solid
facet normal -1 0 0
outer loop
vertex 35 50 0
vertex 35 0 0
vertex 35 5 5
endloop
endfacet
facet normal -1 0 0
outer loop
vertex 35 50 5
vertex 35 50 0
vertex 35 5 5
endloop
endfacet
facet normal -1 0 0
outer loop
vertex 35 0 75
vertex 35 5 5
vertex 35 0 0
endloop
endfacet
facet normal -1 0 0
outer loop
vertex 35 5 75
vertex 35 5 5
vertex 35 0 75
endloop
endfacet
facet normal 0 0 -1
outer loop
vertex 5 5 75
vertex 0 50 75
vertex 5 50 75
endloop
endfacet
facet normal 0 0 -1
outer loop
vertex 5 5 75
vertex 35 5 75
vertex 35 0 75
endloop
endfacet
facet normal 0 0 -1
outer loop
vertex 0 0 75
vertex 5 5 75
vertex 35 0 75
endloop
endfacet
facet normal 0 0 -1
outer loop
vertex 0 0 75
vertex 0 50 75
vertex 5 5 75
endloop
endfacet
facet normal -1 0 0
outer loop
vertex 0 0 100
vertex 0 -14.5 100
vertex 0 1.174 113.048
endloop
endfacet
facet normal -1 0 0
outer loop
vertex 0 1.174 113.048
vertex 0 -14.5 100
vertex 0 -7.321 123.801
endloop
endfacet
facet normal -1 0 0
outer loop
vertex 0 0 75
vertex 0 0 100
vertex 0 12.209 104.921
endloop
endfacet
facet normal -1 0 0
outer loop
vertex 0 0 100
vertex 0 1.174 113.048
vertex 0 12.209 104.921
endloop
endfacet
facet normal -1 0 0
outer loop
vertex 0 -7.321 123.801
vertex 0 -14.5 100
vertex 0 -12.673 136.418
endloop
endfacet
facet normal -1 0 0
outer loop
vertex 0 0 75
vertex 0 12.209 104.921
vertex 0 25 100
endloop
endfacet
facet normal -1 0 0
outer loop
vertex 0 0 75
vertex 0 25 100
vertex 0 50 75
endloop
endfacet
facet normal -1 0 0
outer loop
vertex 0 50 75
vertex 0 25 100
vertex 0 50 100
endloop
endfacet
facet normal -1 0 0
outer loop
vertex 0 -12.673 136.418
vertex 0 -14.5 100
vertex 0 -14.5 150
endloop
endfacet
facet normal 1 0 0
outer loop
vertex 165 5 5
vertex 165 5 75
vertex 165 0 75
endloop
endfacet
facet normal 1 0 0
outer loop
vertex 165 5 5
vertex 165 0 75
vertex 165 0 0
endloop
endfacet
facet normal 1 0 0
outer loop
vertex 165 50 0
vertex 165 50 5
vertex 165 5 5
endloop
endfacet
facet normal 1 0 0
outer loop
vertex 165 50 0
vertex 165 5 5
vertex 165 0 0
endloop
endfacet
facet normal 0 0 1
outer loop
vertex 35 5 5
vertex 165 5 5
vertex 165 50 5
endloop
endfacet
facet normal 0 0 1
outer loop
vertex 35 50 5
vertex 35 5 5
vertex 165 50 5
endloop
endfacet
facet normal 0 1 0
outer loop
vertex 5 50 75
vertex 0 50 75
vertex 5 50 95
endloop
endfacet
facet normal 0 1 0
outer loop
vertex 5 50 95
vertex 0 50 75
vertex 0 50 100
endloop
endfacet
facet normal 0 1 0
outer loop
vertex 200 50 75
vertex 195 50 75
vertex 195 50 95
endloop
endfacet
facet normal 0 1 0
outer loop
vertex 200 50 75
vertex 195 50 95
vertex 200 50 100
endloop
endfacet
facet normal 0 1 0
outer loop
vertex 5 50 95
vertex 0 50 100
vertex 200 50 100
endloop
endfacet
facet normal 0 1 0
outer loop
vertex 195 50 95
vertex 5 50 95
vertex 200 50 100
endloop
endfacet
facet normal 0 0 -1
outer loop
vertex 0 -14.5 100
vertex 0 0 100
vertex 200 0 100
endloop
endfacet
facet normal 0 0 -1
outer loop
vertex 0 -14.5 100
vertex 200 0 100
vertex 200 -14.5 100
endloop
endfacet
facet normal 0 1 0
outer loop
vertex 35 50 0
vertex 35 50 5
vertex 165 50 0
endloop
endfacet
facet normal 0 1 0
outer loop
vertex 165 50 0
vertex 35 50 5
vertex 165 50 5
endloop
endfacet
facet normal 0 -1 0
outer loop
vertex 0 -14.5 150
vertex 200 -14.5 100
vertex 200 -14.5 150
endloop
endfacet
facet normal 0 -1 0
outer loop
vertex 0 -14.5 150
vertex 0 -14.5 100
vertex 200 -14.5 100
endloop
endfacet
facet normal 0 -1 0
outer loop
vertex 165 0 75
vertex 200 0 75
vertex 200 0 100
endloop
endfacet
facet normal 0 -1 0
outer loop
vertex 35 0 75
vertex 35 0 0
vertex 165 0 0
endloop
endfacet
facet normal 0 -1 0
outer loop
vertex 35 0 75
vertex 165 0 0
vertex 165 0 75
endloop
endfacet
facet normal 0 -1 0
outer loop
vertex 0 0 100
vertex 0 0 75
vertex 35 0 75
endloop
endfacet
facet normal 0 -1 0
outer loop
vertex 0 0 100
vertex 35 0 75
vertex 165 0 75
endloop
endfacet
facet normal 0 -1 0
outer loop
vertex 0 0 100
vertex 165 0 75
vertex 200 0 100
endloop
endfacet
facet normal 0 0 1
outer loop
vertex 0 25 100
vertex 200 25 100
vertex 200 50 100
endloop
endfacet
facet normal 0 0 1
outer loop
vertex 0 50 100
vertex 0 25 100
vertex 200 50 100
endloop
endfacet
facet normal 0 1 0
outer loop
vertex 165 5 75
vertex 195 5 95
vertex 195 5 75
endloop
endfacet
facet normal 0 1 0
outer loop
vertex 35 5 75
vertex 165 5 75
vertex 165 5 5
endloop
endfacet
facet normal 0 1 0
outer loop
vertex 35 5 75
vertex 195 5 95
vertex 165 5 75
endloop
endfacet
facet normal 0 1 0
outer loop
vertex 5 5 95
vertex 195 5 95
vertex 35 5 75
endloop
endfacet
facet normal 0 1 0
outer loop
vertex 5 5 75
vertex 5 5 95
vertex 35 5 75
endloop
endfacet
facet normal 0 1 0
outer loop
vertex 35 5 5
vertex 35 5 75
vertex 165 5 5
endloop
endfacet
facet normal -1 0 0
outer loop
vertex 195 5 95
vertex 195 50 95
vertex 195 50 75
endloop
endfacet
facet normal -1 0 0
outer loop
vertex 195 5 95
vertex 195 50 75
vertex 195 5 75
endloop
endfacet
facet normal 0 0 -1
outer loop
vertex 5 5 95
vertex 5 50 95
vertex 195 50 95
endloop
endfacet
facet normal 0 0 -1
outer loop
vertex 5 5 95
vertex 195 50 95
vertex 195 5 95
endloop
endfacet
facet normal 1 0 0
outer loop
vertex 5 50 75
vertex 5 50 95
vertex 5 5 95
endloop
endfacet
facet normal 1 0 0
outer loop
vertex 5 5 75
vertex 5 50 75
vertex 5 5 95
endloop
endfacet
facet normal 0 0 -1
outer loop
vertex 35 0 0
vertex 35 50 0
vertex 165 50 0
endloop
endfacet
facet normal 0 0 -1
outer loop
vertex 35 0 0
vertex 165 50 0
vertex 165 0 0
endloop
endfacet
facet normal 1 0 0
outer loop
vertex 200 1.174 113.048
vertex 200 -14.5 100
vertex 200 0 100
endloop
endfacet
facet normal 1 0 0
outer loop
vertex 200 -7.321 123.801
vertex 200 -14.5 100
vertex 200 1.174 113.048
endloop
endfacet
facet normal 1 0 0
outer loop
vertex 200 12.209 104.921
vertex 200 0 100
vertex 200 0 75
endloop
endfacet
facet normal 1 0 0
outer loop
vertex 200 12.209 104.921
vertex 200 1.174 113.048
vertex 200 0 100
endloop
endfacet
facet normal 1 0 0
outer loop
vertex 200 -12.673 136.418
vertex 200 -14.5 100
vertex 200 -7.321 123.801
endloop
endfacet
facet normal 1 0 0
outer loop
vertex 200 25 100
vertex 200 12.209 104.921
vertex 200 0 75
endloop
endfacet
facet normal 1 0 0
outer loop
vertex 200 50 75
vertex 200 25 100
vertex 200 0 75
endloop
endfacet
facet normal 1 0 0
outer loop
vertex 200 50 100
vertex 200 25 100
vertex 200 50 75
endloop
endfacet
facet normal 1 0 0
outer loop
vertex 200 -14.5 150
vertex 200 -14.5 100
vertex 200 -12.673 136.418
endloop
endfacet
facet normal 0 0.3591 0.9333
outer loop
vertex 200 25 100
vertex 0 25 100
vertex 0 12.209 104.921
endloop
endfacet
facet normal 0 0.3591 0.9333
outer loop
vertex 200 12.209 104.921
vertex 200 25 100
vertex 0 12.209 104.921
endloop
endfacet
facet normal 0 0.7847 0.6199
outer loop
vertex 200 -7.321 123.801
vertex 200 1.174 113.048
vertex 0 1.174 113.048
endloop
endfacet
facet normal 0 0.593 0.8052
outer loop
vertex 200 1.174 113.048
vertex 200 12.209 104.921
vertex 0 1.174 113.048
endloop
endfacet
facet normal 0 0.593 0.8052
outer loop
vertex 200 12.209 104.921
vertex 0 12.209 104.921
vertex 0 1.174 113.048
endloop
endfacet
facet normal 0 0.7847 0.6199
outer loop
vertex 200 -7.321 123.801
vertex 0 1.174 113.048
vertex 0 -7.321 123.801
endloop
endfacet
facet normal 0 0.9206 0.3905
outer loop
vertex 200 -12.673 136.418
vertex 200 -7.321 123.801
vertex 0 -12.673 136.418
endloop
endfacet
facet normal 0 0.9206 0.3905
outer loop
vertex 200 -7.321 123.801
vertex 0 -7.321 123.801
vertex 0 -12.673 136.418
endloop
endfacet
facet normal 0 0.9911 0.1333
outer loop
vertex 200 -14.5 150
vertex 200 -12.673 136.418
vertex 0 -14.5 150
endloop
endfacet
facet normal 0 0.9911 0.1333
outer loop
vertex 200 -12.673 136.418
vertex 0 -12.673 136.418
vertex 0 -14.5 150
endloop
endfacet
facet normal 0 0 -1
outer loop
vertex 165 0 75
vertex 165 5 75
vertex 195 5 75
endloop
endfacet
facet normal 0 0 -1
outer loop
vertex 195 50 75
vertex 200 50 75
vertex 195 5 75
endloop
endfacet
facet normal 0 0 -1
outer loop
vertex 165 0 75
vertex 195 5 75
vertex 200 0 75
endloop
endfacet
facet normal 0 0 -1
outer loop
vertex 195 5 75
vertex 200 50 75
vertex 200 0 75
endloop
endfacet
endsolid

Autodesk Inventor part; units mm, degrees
ref_plane "YZ Plane" through (0, 0, 0) normal (1, 0, 0) x (0, 1, 0)
ref_plane "XZ Plane" through (0, 0, 0) normal (0, 1, 0) x (-1, 0, 0)
ref_plane "XY Plane" through (0, 0, 0) normal (0, 0, 1) x (1, 0, 0)
sketch "Sketch6" plane through (0, 0, 0) normal (1, 0, 0) x (0, 1, 0)
  line L0 (0, 0) -> (0, 100)
  line L1 (0, 100) -> (50, 100)
  line L2 (50, 100) -> (50, 95)
  line L3 (50, 95) -> (5, 95)
  line L4 (5, 95) -> (5, 5)
  line L5 (5, 5) -> (50, 5)
  line L6 (50, 5) -> (50, 0)
  line L7 (50, 0) -> (0, 0)
  line L8 (0, 100) -> (-14.5, 100)
  line L9 (-14.5, 100) -> (-14.5, 150)
  arc A0 (-14.5, 150) -> (25, 100) centre (36.8956, 150) ccw
  dimension "d66" = 14.5
  dimension "d67" = 50
  dimension "d68" = 50
  dimension "d69" = 45
  dimension "d87" = 90
extrude "Extrusion6" add sketch "Sketch6" along normal blind 200
sketch "Sketch7" plane through (0, 5, 95) normal (0, 0, -1) x (-1, 0, 0)
  line L0 (0, 45) -> (-200, 45) projected
  line L1 (0, 0) -> (-200, 0) projected
  line L2 (-200, 45) -> (-195, 45)
  line L3 (-195, 45) -> (-195, 0)
  line L4 (-195, 0) -> (-200, 0)
  line L5 (-200, 0) -> (-200, 45)
  point P0 (0, -5)
  dimension "d52" = 5
extrude "Extrusion7" add sketch "Sketch7" along normal blind 90
sketch "Sketch8" plane through (0, 5, 95) normal (0, 0, -1) x (-1, 0, 0)
  line L0 (0, 45) -> (-195, 45) projected
  line L1 (0, 0) -> (-195, 0) projected
  line L2 (0, 45) -> (-5, 45)
  line L3 (-5, 45) -> (-5, 0)
  line L4 (-5, 0) -> (0, 0)
  line L5 (0, 0) -> (0, 45)
  point P0 (0, -5)
  dimension "d55" = 5
extrude "Extrusion8" add sketch "Sketch8" along normal blind 90
sketch "Sketch9" plane through (200, 0, 0) normal (1, 0, 0) x (0, 0, -1)
  line L0 (0, 0) -> (0, 50) projected
  line L1 (-100, 0) -> (0, 0) projected
  line L2 (0, 50) -> (-75, 50)
  line L3 (-75, 50) -> (-75, 0)
  line L4 (-75, 0) -> (0, 0)
  line L5 (0, 0) -> (0, 50)
  circle A0 centre (-35, 18) radius 33.5
  dimension "d95" = 75
  dimension "d96" = 67
extrude "Extrusion9" cut sketch "Sketch9" against normal blind 35 contours L1 A0 L2 L0 | L1 A0 L2 | L1 L3 L2 A0
sketch "Sketch10" plane through (0, 0, 0) normal (-1, 0, 0) x (0, 0, 1)
  line L0 (0, 50) -> (100, 50) projected
  line L1 (100, 0) -> (0, 0) projected
  line L2 (0, 50) -> (75, 50)
  line L3 (75, 50) -> (75, 0)
  line L4 (75, 0) -> (0, 0)
  line L5 (0, 0) -> (0, 50)
  circle A0 centre (35, 18) radius 33.5
  dimension "d94" = 75
  dimension "d97" = 67
extrude "Extrusion10" cut sketch "Sketch10" against normal blind 35 contours L0 A0 L1 L5 | L0 A0 L1 | L0 L3 L1 A0
properties part number "intro 2 robot"
